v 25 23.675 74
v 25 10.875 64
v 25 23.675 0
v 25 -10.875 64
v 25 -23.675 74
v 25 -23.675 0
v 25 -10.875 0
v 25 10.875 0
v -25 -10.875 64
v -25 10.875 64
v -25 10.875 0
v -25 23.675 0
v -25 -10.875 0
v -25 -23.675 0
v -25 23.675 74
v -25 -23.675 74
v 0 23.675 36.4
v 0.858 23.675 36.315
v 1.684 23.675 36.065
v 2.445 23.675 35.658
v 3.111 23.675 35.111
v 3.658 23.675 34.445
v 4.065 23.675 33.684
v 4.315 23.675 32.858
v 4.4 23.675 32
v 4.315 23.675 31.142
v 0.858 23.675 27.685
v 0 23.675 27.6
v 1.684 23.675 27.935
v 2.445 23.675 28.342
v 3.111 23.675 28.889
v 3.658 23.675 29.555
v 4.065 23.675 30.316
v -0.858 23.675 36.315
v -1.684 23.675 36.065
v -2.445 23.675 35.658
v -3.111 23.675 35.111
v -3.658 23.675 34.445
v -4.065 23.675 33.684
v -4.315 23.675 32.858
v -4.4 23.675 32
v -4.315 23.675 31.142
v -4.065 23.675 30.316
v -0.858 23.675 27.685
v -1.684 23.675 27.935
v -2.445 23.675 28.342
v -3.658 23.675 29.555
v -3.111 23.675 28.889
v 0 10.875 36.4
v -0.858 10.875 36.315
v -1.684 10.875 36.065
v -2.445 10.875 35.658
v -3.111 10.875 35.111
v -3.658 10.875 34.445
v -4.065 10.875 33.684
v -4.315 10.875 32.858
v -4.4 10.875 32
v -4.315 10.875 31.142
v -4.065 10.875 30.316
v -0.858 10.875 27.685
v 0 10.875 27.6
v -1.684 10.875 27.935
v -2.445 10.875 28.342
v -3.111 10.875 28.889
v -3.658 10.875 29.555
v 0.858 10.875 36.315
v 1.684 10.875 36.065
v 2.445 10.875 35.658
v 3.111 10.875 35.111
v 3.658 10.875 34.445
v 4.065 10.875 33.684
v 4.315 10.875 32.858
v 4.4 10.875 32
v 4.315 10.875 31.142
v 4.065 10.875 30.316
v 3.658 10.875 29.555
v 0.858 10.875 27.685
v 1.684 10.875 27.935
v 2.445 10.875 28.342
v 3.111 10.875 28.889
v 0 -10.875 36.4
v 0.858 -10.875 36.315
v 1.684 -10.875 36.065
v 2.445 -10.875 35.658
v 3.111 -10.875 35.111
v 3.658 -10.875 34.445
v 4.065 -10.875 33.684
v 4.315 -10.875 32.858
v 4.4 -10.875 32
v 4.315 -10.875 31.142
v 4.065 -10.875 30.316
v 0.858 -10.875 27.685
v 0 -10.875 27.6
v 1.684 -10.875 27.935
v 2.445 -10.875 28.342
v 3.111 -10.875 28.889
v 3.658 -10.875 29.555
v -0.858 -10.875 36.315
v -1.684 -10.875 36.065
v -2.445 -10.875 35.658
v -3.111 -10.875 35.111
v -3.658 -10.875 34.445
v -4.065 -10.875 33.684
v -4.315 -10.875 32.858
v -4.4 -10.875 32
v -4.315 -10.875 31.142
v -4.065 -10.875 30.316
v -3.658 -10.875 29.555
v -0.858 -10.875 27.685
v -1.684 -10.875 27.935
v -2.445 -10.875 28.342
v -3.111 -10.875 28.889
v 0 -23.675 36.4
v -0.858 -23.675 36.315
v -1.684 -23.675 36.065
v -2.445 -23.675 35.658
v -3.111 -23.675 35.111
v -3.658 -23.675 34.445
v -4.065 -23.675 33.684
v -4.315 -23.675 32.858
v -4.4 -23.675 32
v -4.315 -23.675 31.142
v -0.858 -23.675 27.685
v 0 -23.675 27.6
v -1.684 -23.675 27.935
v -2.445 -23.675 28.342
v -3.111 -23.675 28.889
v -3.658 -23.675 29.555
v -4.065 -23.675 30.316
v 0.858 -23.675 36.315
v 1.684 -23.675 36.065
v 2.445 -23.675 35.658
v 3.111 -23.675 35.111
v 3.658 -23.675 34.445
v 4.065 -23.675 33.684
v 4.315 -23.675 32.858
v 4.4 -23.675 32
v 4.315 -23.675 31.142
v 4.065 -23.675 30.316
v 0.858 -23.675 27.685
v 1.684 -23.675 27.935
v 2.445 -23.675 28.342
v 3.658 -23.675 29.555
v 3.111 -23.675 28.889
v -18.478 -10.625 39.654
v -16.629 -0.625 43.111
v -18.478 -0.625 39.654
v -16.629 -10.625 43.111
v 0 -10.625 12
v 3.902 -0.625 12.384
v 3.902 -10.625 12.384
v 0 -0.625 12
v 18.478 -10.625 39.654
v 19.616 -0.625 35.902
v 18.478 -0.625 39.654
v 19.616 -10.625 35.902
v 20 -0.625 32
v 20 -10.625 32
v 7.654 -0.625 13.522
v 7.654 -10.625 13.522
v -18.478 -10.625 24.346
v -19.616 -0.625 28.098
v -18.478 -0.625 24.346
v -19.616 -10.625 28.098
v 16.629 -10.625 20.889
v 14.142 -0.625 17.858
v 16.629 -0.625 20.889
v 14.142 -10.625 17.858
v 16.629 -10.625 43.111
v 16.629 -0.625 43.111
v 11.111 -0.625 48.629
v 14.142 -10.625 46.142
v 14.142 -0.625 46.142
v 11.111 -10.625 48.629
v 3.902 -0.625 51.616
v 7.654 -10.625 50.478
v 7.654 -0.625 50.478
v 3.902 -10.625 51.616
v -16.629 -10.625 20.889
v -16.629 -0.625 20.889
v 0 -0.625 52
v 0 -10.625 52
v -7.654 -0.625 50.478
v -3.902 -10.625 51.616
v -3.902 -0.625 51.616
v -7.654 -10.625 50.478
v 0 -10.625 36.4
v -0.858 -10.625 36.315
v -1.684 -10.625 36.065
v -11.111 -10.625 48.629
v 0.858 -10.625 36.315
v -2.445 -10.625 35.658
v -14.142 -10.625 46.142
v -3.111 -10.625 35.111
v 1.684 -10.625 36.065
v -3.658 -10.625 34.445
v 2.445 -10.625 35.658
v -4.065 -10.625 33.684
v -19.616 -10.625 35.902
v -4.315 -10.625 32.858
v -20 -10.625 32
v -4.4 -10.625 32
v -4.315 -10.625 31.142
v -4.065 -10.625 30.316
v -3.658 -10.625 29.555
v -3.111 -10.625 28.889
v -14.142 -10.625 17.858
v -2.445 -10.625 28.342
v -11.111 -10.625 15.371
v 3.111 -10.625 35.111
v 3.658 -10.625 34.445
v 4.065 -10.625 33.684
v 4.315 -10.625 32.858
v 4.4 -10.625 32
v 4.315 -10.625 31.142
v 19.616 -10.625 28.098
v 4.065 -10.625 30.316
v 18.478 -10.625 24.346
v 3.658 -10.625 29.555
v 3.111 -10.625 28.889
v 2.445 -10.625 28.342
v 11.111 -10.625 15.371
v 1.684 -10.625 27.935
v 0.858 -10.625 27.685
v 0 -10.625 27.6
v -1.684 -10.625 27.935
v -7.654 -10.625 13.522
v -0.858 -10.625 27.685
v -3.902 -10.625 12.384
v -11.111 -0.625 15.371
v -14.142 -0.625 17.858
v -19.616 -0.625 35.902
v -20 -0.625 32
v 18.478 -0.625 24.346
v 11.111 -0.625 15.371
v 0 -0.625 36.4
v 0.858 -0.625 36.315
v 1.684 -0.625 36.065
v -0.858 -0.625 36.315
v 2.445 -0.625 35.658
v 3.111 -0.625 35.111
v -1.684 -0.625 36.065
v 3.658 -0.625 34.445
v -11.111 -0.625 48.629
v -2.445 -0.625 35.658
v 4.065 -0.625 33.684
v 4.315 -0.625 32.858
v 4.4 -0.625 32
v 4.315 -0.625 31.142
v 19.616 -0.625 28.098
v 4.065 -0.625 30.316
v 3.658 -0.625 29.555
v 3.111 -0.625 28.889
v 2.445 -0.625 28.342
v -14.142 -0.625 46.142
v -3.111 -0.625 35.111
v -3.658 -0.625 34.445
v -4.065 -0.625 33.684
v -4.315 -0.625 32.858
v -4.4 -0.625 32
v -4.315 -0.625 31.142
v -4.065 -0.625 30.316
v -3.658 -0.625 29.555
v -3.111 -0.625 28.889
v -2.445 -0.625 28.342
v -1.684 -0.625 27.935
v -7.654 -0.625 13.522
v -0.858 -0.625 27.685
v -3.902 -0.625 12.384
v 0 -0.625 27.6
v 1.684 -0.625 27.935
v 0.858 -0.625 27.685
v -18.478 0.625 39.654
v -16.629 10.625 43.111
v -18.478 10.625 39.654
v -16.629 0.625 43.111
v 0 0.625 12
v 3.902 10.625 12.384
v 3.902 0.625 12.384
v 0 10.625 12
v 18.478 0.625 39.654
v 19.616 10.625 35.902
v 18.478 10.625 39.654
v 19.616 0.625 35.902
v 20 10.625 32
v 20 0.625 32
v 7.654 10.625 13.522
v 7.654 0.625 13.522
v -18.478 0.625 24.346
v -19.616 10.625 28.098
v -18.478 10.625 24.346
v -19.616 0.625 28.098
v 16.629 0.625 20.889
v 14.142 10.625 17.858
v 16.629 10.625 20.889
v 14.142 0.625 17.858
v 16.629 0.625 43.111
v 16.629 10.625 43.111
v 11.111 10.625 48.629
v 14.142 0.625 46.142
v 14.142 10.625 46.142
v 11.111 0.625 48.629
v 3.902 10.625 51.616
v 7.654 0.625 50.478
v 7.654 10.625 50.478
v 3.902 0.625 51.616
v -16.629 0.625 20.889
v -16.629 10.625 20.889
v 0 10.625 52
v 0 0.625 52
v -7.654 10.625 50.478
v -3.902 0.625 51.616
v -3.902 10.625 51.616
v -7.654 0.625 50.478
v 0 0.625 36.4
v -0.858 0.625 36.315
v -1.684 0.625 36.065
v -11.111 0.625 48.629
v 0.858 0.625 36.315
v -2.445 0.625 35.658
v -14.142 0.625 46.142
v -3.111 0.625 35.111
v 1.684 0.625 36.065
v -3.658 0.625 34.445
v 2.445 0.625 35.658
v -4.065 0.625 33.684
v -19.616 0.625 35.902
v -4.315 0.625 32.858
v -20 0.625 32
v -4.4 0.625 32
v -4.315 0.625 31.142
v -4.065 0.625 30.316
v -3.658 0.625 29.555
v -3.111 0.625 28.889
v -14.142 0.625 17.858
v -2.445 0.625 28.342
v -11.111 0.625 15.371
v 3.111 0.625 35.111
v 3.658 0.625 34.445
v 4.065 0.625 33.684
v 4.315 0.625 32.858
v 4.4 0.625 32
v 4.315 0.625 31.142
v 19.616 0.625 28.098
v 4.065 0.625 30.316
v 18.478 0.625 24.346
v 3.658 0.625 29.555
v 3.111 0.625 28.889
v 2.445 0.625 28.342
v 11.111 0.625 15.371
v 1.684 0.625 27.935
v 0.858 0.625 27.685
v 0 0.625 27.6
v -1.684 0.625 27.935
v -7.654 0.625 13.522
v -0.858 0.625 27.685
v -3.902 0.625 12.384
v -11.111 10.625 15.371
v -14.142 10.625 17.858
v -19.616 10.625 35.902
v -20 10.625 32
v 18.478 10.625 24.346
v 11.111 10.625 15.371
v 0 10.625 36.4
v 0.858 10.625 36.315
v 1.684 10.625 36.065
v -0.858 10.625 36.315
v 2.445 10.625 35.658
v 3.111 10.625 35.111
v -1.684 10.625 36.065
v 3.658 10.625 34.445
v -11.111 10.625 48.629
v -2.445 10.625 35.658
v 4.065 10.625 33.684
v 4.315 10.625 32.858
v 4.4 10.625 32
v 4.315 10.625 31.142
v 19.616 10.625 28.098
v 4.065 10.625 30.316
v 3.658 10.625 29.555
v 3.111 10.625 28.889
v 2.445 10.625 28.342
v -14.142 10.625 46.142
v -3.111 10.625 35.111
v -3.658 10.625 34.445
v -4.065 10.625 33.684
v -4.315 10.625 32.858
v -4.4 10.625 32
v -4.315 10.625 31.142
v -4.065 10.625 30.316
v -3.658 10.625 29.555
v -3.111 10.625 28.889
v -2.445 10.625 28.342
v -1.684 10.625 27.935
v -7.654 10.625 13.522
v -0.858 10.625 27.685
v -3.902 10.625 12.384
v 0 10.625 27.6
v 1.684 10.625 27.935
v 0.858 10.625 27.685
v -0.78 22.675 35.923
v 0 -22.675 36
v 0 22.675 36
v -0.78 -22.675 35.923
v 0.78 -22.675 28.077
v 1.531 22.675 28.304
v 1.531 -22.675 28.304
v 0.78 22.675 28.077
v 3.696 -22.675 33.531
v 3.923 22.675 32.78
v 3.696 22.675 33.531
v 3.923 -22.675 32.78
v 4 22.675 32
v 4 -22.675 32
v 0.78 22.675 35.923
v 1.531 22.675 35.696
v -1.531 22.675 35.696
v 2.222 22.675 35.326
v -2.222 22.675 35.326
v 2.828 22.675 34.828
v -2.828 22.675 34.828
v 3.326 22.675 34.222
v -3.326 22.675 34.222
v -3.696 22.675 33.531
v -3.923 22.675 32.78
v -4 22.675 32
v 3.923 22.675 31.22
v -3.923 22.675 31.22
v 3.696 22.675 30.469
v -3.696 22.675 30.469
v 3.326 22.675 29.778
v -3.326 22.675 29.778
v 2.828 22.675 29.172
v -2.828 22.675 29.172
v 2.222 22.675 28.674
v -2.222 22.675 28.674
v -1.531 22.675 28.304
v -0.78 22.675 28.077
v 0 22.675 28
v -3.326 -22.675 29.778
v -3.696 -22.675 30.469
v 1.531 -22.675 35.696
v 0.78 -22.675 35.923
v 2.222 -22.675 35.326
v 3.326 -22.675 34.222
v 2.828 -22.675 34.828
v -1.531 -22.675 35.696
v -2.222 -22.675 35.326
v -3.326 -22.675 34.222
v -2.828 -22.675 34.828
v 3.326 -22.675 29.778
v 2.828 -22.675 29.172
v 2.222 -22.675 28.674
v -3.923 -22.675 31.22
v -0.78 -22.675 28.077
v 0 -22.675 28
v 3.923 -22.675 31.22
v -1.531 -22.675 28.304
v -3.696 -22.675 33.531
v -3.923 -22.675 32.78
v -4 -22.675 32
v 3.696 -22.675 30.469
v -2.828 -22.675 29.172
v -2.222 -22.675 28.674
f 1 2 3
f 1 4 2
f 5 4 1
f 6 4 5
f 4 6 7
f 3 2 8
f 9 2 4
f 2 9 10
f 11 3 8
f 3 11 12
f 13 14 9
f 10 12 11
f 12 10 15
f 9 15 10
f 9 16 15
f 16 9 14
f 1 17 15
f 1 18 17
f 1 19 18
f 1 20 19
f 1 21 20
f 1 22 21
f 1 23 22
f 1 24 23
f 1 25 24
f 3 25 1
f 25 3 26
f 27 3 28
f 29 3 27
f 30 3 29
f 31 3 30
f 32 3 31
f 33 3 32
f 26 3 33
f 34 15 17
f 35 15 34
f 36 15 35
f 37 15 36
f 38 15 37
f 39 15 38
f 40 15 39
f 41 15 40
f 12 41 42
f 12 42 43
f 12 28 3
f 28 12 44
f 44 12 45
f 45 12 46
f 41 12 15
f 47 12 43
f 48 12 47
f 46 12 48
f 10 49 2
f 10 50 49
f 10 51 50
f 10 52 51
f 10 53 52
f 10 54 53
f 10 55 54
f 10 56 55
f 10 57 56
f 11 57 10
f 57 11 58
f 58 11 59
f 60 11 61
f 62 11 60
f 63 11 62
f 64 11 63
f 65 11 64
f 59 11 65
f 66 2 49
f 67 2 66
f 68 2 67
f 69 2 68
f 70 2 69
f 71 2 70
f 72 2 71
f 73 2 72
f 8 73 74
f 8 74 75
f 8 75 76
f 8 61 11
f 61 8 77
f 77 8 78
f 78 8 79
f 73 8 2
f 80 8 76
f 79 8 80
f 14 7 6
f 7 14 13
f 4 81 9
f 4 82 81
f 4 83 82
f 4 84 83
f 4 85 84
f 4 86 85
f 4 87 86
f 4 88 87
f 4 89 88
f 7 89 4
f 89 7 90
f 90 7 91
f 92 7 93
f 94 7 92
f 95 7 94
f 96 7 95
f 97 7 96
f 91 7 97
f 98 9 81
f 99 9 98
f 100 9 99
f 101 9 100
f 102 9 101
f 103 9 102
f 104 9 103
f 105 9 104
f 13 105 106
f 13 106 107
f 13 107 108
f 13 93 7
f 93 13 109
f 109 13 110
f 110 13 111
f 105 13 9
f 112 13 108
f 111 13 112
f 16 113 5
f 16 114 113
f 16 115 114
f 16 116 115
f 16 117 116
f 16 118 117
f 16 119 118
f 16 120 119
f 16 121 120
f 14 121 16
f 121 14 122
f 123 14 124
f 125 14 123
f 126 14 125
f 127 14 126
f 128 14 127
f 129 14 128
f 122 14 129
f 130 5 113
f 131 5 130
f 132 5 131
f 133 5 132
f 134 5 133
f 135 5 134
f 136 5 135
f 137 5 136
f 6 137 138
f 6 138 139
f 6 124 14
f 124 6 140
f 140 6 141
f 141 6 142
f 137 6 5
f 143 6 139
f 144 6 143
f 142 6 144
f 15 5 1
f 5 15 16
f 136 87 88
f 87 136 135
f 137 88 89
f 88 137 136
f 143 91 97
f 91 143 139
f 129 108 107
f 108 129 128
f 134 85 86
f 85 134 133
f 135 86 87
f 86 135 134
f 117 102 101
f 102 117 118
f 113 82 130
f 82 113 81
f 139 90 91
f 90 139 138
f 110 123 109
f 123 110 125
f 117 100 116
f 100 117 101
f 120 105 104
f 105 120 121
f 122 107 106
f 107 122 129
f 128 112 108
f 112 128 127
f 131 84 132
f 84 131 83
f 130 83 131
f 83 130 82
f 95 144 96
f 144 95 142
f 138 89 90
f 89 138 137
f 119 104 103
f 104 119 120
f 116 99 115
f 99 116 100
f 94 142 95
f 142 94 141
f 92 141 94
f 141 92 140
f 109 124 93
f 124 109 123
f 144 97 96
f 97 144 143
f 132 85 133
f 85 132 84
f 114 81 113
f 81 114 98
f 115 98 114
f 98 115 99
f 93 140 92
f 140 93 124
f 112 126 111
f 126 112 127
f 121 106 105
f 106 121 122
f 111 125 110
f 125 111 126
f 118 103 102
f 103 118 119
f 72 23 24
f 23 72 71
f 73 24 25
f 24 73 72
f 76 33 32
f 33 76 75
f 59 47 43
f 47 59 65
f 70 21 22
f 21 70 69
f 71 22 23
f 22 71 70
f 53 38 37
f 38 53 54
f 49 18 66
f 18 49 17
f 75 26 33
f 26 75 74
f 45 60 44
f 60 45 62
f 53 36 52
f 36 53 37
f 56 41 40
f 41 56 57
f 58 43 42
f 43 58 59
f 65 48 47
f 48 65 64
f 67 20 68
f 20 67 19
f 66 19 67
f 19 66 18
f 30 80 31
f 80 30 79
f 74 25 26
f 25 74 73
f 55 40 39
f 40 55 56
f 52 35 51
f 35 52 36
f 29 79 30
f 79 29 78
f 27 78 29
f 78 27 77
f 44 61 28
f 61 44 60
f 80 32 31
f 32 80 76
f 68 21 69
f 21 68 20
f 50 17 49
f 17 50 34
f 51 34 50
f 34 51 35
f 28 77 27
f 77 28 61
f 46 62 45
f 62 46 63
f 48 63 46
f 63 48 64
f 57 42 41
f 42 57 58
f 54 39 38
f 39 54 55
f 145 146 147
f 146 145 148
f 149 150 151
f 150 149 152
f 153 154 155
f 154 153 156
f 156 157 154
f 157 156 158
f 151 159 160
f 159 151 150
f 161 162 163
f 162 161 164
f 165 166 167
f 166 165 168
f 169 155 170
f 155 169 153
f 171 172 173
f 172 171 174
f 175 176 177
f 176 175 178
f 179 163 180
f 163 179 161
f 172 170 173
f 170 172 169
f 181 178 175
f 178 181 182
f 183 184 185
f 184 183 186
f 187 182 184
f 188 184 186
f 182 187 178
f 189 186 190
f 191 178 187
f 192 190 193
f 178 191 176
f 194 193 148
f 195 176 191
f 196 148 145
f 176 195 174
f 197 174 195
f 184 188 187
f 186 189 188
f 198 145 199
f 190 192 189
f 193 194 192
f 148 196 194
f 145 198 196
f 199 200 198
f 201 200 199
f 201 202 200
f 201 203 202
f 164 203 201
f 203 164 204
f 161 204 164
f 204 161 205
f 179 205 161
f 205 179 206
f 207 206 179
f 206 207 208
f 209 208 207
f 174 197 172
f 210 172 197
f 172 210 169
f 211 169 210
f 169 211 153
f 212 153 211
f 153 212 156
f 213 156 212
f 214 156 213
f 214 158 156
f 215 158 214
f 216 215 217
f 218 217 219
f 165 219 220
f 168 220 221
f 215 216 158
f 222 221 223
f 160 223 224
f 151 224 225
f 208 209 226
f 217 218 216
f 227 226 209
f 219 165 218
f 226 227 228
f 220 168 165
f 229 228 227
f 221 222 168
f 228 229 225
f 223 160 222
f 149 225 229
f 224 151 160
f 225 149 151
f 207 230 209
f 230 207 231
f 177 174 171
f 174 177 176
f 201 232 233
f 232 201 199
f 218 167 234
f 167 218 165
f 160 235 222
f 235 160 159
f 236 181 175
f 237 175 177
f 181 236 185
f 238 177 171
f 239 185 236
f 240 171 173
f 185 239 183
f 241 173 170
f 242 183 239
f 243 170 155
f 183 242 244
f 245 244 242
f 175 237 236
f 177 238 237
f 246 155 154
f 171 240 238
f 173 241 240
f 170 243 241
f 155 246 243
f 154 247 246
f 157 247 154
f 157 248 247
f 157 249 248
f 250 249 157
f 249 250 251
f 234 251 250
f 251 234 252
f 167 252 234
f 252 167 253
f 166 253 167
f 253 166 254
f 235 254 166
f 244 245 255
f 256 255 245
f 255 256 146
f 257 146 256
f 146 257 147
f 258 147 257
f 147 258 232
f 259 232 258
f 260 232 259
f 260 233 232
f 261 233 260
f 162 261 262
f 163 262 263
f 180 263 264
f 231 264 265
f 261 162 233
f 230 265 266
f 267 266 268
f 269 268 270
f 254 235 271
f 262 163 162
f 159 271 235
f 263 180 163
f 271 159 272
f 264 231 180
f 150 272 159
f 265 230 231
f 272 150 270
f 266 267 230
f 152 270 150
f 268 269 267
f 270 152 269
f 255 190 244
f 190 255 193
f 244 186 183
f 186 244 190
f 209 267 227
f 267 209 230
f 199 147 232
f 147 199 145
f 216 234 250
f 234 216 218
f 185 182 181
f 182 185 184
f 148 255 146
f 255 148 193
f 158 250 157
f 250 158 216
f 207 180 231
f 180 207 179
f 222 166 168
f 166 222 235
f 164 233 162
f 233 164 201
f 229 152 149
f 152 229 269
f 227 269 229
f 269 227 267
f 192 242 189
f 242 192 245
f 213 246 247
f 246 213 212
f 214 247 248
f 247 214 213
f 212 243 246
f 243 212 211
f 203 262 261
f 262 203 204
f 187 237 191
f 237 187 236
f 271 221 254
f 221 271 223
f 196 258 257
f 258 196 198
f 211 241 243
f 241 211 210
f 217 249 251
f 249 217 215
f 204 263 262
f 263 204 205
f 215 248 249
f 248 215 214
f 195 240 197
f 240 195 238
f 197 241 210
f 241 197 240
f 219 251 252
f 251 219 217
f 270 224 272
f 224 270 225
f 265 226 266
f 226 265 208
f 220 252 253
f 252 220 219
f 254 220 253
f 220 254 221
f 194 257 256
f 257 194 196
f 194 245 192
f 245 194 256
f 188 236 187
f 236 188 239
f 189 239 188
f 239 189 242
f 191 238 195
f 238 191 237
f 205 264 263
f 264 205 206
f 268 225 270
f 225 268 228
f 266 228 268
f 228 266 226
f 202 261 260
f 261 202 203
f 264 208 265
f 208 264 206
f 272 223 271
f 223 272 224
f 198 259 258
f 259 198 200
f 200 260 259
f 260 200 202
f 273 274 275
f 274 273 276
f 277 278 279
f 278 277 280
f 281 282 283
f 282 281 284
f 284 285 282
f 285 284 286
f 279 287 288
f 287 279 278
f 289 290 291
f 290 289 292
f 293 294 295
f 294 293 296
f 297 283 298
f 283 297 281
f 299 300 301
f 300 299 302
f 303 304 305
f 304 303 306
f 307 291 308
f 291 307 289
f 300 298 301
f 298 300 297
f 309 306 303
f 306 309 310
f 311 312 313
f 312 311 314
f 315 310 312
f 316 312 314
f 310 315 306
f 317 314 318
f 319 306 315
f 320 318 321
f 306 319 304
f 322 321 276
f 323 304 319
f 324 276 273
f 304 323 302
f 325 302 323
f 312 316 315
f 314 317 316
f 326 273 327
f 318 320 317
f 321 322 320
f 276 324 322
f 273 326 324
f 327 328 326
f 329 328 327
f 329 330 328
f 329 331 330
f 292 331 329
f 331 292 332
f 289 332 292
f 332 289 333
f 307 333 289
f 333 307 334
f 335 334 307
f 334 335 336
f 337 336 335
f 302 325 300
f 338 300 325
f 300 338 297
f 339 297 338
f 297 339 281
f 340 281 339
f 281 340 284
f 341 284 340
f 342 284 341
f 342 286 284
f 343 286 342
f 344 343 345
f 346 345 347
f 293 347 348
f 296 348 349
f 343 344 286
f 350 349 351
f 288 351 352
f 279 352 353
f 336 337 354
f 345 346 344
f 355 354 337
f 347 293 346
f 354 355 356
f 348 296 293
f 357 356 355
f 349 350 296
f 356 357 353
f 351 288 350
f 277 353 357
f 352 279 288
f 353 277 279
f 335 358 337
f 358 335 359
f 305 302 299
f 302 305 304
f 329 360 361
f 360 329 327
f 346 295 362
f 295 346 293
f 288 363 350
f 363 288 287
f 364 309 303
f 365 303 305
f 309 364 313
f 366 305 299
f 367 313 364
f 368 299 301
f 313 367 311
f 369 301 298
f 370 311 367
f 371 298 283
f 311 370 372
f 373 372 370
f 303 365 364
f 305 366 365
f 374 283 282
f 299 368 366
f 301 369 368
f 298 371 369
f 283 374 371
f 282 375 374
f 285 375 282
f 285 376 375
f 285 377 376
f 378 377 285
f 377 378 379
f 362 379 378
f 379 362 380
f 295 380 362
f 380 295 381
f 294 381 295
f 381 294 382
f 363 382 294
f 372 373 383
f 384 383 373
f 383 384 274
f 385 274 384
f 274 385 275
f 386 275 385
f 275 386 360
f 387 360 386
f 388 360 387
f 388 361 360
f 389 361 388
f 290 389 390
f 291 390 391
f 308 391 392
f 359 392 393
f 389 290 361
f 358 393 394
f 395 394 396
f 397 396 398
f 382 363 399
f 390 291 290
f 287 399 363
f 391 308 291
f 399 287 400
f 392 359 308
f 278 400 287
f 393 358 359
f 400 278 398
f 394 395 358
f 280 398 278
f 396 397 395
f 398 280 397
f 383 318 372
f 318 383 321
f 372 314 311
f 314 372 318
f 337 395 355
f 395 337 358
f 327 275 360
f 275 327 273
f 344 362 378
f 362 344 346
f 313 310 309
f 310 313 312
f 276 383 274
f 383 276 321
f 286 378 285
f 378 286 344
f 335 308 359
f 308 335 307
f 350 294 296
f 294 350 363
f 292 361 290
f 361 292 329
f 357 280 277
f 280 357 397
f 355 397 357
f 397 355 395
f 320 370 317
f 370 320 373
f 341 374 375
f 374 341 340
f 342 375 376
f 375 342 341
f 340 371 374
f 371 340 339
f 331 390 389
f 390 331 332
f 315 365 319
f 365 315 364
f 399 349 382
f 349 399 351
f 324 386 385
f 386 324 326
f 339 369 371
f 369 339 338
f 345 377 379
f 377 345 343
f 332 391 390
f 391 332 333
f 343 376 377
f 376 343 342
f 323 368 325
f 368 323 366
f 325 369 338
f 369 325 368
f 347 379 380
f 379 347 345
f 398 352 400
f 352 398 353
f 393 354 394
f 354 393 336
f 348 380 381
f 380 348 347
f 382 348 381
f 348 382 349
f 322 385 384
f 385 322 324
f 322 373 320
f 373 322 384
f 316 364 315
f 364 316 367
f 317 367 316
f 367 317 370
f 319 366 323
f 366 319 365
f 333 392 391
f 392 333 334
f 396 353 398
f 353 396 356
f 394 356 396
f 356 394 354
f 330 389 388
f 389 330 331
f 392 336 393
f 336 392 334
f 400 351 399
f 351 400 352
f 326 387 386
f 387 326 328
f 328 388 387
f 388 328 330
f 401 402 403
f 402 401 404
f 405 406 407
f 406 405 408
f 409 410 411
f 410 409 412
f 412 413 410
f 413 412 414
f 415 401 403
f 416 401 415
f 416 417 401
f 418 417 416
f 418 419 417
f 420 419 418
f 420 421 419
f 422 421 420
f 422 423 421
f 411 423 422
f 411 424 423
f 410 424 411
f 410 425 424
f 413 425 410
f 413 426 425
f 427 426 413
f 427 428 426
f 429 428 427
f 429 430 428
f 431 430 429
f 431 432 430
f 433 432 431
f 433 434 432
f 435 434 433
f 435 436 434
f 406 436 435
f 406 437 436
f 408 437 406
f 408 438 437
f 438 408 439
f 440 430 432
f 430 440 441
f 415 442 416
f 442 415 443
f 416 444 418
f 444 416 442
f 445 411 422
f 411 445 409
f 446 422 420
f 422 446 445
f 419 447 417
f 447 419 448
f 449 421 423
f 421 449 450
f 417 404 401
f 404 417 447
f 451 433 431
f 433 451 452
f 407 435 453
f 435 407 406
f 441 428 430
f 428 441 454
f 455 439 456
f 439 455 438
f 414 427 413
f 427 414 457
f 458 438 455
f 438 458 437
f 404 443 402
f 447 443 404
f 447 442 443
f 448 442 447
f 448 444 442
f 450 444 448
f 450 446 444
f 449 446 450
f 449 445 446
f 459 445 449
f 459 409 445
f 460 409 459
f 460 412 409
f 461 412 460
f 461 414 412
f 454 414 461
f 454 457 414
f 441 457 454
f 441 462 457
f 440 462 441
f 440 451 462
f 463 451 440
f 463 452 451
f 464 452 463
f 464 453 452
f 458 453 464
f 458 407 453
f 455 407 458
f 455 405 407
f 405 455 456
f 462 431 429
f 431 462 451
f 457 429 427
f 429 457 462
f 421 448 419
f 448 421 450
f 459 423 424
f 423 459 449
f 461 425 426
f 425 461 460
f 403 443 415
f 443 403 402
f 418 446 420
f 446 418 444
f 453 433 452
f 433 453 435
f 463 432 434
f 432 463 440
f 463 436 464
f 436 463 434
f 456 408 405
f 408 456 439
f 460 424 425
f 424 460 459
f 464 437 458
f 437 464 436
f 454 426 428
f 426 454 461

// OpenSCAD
$fn = 32;

// ------------------------------------------------------------------------
// Trolley wheel set: wheels d40, fork 64 mm tall
// Every part is its own module, assembly() places every instance.
// ------------------------------------------------------------------------

// --- part 1 ---
module trolley_fork() {
  difference() {
    union() {
      translate([-25, 10.875, 0]) cube([50, 12.8, 64]);
      translate([-25, -23.675, 0]) cube([50, 12.8, 64]);
      translate([-25, -23.675, 64]) cube([50, 47.35, 10]);
    }
    translate([0, -17.275, 32]) rotate([90, 0, 0]) cylinder(h = 14.8, d = 8.8, center = true);
    translate([0, 17.275, 32]) rotate([90, 0, 0]) cylinder(h = 14.8, d = 8.8, center = true);
  }
}

// --- part 2 ---
module trolley_wheel() {
  difference() {
      translate([0, 0, 0]) cylinder(h = 10, d = 40);
      translate([0, 0, -1]) cylinder(h = 12, d = 8.8);
    }
}

// --- part 3 ---
module trolley_axle() {
  translate([0, 0, -22.675]) cylinder(h = 45.35, d = 8);
}

// --- assembly ---
module assembly() {
  color([0.80, 0.24, 0.20]) translate([0, 0, 0]) rotate([0, 0, 0]) trolley_fork();
  color([0.20, 0.45, 0.75]) translate([0, -0.625, 32]) rotate([90, 0, 0]) trolley_wheel();
  color([0.25, 0.62, 0.32]) translate([0, 10.625, 32]) rotate([90, 0, 0]) trolley_wheel();
  color([0.92, 0.70, 0.18]) translate([0, 0, 32]) rotate([90, 0, 0]) trolley_axle();
}

assembly();
